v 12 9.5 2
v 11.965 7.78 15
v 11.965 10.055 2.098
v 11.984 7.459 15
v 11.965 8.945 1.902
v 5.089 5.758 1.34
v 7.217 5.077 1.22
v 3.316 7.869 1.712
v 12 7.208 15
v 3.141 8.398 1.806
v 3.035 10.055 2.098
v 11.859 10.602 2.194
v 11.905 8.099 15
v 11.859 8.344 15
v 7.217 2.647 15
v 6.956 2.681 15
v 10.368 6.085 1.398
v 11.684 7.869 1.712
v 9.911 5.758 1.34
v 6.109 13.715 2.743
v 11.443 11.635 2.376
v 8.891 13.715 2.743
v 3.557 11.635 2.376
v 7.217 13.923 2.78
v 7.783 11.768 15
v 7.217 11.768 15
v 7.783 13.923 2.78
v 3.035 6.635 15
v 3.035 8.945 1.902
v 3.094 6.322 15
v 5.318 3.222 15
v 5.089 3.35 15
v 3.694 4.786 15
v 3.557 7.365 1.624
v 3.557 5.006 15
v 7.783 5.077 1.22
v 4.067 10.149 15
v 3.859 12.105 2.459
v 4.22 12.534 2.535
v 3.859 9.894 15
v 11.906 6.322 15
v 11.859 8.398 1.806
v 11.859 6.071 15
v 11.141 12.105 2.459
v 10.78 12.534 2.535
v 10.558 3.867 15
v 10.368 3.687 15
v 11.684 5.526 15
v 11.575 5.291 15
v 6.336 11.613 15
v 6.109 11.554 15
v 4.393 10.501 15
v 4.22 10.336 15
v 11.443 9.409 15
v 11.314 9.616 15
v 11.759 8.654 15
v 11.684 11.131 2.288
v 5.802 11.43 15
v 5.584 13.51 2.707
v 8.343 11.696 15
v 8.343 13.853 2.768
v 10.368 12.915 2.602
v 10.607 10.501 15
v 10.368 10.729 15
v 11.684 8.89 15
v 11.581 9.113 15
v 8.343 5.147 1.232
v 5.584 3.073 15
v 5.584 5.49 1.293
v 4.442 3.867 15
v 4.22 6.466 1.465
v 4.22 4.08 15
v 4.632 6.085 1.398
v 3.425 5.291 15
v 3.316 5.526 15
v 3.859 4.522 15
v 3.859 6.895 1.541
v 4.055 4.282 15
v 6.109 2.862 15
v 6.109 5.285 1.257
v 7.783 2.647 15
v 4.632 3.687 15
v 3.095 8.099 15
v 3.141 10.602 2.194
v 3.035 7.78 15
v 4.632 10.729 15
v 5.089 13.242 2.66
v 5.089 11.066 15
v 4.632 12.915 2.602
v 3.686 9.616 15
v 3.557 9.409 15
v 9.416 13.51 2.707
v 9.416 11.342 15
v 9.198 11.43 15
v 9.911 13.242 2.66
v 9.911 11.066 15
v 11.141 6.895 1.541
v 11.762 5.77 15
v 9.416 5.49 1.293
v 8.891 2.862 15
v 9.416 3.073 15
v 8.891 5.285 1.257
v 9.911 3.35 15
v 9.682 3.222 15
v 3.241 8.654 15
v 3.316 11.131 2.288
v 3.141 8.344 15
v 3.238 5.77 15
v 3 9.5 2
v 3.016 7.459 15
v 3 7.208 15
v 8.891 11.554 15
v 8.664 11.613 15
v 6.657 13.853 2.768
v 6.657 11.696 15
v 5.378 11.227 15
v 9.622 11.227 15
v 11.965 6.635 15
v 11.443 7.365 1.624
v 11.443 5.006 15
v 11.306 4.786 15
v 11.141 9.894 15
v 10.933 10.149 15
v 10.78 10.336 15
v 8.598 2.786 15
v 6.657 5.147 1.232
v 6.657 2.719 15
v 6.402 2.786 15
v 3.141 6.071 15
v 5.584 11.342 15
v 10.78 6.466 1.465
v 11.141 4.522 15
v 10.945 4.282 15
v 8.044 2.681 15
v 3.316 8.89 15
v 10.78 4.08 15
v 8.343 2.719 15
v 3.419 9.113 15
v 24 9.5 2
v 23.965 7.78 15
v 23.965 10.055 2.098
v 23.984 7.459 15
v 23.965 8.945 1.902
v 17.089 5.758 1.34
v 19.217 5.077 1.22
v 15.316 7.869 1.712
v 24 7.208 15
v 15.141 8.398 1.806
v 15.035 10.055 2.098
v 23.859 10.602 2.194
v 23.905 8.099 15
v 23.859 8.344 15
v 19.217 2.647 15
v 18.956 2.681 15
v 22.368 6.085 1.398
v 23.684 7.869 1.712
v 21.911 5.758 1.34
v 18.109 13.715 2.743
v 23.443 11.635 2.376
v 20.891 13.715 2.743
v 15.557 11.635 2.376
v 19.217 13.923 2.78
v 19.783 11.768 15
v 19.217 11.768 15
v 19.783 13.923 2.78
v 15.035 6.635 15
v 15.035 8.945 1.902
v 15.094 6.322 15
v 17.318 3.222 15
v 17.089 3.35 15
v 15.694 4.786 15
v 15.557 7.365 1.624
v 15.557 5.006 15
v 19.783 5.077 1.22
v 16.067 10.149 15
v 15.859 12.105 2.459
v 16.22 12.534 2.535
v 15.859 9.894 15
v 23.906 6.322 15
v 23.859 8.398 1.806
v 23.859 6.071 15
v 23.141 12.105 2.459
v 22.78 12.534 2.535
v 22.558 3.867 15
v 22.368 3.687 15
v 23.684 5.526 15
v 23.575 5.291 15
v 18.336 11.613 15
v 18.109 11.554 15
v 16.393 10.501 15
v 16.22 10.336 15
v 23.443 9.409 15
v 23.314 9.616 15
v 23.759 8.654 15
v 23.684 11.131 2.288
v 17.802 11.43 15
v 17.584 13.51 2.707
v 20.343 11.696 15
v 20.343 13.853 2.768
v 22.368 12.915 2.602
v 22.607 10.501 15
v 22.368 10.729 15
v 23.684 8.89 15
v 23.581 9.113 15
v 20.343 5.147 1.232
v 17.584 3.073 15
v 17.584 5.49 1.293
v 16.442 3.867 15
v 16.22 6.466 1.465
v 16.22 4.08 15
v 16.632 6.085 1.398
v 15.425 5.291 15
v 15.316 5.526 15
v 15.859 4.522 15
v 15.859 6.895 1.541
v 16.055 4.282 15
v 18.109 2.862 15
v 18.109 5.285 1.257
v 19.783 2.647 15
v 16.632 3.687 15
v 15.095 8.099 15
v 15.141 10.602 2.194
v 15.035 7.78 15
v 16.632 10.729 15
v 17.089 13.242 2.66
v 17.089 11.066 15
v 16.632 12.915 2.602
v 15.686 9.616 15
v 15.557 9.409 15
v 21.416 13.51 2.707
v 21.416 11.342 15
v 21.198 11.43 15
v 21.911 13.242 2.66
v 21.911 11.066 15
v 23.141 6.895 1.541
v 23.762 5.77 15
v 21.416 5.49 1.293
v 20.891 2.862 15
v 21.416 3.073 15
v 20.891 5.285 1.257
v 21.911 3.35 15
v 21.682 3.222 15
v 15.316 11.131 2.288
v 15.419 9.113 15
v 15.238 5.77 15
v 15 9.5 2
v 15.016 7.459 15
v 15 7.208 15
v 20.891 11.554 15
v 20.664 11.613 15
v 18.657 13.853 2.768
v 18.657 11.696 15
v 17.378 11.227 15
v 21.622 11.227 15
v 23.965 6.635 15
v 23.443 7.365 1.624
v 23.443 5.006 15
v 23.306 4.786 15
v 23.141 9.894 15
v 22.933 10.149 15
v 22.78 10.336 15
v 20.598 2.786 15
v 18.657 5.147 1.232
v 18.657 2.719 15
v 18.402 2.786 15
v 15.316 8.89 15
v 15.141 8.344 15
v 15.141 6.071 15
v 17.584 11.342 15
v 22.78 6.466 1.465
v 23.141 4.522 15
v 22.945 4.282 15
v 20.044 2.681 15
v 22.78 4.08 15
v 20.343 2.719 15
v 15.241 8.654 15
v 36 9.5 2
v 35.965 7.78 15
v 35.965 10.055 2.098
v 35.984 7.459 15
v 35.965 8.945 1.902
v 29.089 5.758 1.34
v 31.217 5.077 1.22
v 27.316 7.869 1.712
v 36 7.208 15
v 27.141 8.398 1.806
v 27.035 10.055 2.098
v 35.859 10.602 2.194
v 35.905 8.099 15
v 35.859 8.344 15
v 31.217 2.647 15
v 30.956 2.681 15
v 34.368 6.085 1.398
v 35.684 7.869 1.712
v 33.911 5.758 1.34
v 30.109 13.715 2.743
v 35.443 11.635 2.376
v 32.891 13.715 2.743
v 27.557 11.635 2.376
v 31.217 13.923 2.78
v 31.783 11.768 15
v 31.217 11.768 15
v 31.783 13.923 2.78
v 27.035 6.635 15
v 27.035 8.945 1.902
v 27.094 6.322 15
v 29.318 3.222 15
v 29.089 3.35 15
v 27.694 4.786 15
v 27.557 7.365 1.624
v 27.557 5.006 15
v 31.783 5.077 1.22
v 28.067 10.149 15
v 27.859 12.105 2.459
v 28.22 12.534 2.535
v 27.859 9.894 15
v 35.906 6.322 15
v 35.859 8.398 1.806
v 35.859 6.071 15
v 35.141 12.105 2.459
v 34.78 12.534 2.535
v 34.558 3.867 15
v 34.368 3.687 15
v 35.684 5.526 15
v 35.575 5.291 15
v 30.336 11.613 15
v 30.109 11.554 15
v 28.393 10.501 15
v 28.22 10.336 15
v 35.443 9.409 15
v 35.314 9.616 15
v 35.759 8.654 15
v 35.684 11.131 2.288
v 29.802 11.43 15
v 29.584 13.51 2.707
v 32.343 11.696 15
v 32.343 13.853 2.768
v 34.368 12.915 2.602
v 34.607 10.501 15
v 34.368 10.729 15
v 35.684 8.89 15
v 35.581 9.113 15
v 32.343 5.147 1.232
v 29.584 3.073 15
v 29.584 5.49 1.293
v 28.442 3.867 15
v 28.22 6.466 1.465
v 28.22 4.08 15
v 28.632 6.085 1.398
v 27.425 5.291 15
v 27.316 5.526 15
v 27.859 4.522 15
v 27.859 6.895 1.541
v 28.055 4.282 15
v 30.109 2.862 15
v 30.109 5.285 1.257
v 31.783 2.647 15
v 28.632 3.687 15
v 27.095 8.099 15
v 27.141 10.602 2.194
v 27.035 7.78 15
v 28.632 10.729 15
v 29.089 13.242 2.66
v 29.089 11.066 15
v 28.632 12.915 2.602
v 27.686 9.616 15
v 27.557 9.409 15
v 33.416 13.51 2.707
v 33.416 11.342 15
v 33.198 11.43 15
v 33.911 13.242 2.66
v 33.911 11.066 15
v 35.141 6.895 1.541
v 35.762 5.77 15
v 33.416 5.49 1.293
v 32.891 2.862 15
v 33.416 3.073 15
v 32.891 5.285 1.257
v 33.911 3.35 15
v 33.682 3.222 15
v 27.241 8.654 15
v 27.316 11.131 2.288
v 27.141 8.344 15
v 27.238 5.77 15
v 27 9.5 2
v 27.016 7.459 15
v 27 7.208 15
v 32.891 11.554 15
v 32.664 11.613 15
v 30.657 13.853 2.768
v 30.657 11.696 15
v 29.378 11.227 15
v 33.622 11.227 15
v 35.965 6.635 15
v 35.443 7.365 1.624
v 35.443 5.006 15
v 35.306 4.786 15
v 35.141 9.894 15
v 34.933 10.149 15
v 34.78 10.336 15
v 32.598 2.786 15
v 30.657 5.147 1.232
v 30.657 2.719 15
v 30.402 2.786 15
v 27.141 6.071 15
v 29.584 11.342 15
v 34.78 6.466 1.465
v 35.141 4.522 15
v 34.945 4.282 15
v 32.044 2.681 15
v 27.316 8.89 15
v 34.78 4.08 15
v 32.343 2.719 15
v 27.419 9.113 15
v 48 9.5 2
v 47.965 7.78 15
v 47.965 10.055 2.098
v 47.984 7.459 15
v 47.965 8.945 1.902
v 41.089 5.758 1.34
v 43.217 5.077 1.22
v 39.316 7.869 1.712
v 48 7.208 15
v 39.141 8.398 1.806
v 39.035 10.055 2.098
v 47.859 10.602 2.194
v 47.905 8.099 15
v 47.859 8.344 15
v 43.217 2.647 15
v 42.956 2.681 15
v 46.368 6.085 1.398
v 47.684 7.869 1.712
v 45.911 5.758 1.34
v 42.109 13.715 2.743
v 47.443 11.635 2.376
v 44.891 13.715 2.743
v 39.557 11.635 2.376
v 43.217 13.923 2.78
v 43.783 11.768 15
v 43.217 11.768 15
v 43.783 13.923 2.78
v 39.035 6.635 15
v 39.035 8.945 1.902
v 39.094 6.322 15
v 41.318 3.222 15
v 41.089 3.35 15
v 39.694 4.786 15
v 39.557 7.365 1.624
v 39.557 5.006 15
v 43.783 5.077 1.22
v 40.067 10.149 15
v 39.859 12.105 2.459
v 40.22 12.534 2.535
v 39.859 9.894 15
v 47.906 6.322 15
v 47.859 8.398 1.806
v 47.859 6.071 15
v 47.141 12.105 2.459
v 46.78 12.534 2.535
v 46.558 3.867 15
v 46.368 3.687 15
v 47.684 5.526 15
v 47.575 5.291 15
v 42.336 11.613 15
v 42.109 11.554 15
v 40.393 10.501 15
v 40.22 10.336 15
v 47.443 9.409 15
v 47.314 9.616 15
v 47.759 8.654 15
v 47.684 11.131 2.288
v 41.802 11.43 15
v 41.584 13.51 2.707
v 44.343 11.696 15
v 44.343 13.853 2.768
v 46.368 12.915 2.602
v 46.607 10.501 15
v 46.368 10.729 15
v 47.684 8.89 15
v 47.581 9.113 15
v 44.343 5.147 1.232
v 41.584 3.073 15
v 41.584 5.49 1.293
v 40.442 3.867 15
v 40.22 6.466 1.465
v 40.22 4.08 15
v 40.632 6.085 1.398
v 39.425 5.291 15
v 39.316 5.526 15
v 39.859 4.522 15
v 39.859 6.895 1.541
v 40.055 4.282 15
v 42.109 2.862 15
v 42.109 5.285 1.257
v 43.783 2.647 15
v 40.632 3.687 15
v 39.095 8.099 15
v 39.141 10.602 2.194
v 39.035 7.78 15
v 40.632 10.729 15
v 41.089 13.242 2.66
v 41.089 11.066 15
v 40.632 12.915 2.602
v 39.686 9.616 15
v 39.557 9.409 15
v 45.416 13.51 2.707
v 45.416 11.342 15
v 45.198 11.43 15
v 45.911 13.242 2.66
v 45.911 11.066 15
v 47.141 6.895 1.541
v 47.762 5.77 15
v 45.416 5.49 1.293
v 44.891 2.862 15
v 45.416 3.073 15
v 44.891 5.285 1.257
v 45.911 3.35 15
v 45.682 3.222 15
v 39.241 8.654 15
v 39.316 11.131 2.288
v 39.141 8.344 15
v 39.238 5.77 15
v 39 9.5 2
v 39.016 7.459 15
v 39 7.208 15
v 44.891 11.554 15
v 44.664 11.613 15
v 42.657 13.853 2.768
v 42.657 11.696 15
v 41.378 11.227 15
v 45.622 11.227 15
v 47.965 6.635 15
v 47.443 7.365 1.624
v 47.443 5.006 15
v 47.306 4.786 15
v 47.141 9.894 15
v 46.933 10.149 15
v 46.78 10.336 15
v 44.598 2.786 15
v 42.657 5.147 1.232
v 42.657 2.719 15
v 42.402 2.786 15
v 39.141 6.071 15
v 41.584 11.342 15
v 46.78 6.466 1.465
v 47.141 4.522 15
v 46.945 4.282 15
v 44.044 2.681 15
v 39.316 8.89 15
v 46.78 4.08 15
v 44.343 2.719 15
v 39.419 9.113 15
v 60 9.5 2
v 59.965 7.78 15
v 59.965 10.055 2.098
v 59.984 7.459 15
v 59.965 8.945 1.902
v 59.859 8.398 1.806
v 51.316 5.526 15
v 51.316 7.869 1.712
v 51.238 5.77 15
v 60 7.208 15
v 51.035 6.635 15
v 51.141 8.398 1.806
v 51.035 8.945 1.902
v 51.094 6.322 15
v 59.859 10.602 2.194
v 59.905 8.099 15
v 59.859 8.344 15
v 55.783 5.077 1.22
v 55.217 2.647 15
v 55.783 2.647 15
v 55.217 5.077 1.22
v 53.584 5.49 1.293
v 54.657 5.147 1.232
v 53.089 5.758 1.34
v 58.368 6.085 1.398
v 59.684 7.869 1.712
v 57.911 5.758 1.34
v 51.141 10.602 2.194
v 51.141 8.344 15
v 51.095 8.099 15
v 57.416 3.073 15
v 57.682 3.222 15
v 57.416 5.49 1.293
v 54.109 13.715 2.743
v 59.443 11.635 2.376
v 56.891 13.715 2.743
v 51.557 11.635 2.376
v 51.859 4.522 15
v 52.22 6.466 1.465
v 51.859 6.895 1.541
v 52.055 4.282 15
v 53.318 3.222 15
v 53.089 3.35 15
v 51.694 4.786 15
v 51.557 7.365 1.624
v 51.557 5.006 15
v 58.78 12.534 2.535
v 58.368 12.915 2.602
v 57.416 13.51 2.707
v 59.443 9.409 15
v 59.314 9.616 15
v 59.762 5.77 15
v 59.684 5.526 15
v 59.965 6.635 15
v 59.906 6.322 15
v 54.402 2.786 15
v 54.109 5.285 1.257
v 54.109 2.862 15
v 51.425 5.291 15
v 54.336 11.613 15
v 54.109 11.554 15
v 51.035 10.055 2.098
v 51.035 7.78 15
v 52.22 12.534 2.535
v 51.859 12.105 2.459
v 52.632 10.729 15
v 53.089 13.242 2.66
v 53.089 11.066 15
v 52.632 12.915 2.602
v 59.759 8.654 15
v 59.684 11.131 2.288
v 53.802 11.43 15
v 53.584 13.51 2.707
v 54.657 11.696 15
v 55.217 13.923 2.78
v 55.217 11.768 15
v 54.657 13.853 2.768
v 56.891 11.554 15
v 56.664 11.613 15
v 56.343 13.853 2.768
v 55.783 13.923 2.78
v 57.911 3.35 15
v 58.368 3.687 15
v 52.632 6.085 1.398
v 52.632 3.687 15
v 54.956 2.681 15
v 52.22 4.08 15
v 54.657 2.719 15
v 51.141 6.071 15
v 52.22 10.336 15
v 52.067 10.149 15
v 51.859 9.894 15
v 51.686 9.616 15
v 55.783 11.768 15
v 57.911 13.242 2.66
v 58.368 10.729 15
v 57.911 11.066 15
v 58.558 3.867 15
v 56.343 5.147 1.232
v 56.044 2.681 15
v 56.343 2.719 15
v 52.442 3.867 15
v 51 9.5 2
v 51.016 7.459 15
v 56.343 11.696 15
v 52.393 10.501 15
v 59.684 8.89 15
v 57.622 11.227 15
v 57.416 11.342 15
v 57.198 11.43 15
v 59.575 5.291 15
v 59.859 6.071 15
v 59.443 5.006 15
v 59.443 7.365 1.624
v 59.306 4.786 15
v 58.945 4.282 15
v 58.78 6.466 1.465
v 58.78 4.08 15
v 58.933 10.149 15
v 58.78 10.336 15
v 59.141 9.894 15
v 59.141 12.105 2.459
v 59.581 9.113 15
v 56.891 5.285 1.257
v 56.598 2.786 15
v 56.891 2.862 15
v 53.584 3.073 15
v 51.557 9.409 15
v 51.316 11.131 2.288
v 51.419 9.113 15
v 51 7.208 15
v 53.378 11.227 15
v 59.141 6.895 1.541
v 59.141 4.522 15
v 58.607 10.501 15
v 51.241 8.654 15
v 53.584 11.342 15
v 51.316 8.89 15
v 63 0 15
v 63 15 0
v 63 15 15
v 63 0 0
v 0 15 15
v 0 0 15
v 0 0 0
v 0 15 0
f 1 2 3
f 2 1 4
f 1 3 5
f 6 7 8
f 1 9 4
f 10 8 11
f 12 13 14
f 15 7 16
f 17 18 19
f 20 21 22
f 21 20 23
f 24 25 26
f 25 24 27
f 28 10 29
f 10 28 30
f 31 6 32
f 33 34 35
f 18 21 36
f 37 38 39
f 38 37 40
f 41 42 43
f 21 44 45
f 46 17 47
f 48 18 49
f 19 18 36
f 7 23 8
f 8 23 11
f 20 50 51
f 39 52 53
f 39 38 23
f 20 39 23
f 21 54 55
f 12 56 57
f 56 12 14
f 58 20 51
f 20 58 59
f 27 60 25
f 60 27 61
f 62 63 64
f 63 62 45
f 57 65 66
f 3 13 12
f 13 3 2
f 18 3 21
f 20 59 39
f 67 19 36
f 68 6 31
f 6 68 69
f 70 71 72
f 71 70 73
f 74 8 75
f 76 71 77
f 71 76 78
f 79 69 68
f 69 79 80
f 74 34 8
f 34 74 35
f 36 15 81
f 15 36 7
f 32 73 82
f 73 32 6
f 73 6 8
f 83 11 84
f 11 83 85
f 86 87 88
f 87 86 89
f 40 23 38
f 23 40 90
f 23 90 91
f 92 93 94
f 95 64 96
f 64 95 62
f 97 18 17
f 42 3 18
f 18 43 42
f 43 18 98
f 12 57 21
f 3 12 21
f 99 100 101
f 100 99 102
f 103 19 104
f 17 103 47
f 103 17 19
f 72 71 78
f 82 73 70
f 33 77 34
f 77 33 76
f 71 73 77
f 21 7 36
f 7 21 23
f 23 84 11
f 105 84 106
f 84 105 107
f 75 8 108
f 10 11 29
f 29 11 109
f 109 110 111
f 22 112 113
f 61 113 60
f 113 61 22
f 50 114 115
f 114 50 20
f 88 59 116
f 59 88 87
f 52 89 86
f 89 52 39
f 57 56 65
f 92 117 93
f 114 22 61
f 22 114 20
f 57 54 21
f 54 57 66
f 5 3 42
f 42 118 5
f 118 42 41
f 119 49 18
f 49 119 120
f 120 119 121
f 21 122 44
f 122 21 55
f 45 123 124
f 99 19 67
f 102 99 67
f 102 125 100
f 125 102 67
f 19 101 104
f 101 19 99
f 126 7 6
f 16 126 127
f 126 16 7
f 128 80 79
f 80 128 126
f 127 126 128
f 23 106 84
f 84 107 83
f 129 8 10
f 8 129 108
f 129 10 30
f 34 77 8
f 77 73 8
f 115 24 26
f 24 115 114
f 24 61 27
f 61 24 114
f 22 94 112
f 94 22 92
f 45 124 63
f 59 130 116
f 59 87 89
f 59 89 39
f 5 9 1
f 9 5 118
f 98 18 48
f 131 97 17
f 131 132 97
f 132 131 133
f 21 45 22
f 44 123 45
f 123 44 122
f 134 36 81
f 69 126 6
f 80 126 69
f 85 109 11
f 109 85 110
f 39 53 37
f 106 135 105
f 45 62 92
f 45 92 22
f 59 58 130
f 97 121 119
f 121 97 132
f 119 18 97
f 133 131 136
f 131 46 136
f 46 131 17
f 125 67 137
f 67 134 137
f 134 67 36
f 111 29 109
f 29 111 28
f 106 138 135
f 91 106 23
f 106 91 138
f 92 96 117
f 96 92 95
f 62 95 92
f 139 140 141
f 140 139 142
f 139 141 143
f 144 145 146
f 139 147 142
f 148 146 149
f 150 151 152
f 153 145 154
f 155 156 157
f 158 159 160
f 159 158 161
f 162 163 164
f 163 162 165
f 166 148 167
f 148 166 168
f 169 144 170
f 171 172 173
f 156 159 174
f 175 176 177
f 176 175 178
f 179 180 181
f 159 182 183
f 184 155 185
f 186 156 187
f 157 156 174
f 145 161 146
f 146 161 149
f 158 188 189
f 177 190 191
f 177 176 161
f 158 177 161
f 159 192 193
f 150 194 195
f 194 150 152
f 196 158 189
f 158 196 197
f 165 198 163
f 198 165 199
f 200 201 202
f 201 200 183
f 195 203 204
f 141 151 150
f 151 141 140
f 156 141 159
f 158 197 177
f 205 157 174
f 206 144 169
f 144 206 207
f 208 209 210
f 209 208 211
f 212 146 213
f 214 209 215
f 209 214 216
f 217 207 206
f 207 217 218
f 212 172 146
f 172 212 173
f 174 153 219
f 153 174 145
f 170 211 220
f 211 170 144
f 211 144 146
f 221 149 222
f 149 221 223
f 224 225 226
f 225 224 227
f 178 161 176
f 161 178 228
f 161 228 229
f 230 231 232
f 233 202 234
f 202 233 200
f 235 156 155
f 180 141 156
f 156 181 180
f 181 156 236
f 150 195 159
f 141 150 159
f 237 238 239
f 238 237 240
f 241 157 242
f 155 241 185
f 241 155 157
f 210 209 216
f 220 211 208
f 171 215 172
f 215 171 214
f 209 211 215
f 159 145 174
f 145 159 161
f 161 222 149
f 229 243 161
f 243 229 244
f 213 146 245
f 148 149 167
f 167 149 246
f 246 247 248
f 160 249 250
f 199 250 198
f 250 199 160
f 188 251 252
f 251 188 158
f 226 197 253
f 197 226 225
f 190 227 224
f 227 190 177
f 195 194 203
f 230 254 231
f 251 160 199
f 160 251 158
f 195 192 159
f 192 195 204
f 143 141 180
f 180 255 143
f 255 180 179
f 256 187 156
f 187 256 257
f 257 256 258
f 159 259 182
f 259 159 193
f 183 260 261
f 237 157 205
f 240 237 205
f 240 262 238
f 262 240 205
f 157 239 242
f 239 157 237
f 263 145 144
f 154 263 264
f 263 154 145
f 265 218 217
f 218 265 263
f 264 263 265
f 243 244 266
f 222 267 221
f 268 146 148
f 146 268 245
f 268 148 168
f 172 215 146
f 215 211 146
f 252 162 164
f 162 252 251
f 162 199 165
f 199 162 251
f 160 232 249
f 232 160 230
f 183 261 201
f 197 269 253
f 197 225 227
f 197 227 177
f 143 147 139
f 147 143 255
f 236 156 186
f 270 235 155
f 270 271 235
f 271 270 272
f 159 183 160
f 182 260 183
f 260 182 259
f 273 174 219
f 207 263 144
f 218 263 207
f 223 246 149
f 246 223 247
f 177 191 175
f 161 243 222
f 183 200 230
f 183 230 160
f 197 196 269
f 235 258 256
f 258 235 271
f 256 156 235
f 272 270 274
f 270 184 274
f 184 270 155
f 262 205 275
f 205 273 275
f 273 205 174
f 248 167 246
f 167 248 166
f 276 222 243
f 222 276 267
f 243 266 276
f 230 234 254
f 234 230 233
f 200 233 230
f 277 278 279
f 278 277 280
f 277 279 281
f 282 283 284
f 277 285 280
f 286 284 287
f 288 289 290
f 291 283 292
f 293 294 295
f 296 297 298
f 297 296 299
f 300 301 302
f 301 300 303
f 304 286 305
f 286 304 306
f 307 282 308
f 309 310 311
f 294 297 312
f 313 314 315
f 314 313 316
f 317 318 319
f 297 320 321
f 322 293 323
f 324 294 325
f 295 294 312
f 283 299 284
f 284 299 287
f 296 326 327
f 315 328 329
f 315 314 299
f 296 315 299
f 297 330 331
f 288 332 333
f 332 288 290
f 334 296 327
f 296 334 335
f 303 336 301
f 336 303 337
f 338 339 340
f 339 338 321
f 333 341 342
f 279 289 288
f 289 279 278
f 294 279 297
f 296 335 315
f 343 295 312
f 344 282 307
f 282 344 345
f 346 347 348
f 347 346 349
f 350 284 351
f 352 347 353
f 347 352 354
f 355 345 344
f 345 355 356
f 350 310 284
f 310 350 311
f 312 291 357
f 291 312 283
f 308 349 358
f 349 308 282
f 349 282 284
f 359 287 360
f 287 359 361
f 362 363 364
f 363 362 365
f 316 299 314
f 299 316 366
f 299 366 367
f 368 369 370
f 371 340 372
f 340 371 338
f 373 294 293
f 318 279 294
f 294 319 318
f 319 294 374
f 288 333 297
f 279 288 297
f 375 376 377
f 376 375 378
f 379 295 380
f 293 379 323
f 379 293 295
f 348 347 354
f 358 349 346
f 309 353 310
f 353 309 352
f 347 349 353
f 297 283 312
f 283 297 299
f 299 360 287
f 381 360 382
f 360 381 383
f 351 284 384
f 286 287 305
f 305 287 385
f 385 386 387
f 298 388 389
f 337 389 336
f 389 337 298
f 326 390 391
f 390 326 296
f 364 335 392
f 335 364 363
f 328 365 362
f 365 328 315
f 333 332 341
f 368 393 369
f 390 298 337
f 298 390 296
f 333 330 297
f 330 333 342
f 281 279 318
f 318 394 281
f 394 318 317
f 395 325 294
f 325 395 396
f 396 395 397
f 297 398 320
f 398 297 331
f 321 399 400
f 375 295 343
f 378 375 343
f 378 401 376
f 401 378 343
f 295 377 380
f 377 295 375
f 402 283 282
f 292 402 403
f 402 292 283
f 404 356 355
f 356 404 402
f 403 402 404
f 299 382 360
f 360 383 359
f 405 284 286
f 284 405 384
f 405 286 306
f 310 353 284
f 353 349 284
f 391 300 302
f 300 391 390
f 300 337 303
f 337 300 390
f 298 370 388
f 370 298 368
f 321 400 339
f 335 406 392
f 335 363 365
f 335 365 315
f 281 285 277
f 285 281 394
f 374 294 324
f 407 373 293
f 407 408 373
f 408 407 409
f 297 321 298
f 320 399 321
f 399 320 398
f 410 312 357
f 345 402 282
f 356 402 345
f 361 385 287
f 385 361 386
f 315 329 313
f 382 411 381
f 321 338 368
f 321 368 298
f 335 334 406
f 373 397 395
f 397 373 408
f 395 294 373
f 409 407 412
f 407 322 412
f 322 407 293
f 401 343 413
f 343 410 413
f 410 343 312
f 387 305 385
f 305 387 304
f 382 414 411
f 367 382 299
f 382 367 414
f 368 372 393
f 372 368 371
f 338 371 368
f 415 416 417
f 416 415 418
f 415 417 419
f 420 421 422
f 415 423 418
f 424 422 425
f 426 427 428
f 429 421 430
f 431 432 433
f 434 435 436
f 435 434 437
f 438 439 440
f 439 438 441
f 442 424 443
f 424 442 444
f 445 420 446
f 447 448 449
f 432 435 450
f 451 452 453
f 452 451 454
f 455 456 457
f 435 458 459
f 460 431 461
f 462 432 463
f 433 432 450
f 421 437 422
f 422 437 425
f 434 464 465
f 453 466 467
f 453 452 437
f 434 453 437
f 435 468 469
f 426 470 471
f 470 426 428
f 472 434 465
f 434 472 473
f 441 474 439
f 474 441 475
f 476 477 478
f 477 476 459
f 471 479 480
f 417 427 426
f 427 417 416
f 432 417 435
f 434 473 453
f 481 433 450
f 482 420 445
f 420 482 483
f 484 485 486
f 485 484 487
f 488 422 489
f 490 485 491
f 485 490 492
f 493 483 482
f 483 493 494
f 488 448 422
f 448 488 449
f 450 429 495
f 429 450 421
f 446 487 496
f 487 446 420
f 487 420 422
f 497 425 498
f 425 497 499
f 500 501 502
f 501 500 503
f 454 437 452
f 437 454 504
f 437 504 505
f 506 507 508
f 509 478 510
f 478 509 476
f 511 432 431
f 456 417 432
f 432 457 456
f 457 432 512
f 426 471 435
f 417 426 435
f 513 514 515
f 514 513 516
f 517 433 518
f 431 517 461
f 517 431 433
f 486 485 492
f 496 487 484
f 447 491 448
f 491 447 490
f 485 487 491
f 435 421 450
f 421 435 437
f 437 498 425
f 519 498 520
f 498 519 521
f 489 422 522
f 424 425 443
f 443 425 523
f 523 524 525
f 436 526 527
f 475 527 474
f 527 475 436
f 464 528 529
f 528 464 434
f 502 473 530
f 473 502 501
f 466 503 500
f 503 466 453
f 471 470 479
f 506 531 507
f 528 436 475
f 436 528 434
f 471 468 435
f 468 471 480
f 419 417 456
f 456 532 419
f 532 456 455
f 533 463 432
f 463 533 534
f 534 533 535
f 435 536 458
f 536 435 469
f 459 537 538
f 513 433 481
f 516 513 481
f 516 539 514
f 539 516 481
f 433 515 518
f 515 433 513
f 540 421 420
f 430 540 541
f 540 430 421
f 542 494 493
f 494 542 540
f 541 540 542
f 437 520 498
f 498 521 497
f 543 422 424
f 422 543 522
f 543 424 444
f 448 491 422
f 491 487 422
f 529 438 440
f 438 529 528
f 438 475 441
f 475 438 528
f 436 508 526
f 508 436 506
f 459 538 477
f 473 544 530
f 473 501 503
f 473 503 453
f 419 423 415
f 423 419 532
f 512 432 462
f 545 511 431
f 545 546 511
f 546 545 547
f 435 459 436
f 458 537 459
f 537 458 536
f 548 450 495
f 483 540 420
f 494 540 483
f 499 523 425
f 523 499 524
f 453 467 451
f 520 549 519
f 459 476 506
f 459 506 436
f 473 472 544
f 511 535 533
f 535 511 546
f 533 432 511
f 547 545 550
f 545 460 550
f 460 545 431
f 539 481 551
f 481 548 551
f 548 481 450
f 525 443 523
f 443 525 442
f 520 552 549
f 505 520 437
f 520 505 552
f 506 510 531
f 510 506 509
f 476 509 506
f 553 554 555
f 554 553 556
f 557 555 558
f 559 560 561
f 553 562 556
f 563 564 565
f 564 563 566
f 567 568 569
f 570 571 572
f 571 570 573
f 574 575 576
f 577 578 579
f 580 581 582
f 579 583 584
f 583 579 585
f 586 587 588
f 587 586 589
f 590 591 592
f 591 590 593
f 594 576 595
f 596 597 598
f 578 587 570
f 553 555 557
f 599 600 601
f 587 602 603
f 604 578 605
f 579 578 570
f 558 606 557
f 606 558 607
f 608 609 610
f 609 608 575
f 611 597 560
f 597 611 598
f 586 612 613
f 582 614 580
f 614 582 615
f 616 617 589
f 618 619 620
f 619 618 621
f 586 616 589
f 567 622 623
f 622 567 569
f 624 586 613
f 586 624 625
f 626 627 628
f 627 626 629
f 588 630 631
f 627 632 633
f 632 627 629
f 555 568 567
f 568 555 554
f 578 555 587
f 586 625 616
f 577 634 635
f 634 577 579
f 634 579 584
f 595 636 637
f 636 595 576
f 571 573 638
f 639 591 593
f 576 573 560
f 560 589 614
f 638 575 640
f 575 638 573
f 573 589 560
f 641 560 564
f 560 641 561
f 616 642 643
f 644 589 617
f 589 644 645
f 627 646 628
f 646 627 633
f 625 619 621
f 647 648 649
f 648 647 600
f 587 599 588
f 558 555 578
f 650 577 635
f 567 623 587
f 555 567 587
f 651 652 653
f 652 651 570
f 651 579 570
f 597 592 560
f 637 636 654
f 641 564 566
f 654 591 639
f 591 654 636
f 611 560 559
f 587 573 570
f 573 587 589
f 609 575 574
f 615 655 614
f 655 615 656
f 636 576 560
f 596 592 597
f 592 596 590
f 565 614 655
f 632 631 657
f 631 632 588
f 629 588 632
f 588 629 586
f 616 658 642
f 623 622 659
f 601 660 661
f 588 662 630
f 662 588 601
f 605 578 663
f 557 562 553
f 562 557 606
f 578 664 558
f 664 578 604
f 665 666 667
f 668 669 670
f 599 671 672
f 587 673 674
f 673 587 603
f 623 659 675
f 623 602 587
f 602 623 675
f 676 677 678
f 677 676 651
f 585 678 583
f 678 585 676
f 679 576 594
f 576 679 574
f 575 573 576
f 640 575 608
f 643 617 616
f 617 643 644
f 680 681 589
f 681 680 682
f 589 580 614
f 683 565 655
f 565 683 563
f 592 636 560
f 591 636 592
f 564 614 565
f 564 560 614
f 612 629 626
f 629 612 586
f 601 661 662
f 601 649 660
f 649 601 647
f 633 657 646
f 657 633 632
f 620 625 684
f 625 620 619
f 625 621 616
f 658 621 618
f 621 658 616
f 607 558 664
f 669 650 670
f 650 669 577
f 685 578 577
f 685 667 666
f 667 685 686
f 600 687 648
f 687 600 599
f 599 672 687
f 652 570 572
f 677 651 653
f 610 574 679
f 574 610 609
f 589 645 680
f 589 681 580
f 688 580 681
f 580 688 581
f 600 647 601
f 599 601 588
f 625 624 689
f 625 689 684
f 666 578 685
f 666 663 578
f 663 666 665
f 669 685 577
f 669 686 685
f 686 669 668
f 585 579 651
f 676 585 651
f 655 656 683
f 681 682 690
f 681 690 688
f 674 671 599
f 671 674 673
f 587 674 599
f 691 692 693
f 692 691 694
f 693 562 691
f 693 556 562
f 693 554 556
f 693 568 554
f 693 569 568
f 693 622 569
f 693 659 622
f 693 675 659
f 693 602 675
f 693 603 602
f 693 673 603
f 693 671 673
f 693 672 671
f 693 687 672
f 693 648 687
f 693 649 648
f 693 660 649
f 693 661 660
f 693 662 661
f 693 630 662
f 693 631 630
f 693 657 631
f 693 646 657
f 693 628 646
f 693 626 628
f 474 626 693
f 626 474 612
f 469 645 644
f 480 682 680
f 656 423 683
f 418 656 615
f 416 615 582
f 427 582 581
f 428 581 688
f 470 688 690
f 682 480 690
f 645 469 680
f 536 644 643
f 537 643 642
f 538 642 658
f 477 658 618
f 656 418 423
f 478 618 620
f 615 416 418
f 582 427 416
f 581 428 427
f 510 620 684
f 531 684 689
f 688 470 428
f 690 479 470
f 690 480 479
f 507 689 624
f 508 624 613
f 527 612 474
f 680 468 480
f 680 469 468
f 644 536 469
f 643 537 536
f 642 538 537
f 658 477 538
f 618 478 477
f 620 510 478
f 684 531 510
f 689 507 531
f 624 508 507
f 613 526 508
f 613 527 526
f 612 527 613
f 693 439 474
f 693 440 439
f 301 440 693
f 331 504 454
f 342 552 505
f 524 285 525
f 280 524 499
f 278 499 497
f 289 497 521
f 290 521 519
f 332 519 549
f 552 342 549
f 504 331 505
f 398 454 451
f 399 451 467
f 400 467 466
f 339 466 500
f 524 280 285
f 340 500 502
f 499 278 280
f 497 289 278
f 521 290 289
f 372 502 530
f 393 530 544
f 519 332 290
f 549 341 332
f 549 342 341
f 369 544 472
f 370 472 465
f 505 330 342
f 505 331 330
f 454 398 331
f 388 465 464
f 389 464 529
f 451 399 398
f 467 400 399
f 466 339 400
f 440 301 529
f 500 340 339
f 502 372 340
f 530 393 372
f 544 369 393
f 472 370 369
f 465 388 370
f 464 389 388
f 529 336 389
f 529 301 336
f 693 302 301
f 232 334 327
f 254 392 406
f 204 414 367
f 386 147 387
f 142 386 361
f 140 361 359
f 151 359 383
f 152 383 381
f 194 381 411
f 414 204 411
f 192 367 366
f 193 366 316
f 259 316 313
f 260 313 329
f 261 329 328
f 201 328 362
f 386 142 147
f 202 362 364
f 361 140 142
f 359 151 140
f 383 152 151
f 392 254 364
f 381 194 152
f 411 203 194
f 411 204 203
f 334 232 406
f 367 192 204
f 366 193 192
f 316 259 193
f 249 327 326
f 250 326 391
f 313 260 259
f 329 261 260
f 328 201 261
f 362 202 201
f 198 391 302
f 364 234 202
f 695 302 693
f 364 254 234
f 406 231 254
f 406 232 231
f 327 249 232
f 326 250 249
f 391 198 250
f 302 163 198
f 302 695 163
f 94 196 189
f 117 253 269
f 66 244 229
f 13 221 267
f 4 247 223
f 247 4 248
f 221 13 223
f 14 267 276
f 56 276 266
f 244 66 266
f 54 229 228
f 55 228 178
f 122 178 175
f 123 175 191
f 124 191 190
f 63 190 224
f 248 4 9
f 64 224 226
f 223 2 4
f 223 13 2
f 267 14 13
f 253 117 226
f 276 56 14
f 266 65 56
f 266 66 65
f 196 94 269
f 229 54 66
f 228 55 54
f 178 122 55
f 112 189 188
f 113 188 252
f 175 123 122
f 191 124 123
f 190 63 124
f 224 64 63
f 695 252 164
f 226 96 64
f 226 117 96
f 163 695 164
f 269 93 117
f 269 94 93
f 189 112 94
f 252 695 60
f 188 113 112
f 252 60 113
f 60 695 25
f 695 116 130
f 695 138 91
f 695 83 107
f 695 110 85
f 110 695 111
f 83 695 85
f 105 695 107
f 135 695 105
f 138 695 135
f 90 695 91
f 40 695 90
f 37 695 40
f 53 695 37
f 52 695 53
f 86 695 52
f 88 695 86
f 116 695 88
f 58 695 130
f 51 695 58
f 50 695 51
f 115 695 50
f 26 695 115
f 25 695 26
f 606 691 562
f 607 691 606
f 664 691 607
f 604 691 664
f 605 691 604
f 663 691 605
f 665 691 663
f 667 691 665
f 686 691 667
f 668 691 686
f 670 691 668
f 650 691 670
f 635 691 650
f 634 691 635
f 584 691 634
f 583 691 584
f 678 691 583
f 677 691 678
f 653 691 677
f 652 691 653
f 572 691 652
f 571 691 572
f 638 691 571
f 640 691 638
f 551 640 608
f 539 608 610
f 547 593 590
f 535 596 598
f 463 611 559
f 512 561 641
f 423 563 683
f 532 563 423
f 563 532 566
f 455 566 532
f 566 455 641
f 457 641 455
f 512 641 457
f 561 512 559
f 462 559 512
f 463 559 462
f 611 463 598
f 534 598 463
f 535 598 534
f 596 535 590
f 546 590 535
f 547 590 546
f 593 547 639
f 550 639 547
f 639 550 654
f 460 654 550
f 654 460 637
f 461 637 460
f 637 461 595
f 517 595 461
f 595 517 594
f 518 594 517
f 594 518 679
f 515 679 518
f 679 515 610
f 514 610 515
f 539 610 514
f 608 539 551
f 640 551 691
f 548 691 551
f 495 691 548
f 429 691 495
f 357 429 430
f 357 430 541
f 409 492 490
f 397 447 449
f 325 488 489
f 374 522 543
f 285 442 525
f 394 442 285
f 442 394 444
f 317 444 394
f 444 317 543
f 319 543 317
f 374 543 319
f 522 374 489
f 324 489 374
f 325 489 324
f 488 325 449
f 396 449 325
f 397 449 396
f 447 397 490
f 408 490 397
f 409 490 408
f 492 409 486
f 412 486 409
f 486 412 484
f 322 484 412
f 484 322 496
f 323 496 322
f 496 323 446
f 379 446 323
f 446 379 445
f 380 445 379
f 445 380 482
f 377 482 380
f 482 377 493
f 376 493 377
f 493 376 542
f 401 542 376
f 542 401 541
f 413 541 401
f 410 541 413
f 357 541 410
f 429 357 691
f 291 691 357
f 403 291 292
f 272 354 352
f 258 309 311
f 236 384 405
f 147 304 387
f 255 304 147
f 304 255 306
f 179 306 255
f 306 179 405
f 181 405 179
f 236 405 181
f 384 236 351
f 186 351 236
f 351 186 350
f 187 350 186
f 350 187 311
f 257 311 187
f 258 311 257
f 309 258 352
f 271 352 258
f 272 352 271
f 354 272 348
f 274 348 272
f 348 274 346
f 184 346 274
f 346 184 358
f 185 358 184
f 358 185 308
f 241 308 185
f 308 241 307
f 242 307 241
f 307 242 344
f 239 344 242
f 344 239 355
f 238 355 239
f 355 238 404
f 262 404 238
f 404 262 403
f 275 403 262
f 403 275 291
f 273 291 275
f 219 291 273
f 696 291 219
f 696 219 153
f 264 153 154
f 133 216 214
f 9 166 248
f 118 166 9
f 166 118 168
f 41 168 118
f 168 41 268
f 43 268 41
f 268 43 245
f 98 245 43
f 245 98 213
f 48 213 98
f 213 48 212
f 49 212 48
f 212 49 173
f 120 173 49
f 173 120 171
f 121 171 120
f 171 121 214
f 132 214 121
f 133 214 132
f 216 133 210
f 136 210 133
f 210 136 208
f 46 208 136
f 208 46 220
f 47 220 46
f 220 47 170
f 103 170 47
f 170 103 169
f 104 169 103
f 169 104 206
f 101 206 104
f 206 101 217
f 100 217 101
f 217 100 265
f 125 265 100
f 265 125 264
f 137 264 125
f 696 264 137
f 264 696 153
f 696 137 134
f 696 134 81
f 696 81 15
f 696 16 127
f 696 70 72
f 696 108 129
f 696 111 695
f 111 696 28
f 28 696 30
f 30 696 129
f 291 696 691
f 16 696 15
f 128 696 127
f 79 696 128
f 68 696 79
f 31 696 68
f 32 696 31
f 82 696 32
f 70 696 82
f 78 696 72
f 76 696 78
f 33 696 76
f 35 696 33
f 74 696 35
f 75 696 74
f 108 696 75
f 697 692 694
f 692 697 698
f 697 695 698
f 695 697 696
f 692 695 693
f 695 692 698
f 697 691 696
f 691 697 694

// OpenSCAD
N = 5;
dist = 3;
d = 8.5;
tol = 0.5;

blck_l = N * ( d + tol ) + ( N + 1 ) * dist;
blck_w = 2 * dist + d + tol;
blck_h = 15;

difference(){
    cube( [ blck_l, blck_w, blck_h ] );

    for ( i = [ 0 : N - 1 ] ) {
        translate( [ dist + 0.5 * ( d + tol ) + i * ( dist + d + tol ), 0.5 * blck_w + 2, 2 ] )
        rotate( 10, [ 1, 0, 0 ] )
            cylinder( d = d + tol, h = 2 * blck_h, $fn = 50 );
    }
}
